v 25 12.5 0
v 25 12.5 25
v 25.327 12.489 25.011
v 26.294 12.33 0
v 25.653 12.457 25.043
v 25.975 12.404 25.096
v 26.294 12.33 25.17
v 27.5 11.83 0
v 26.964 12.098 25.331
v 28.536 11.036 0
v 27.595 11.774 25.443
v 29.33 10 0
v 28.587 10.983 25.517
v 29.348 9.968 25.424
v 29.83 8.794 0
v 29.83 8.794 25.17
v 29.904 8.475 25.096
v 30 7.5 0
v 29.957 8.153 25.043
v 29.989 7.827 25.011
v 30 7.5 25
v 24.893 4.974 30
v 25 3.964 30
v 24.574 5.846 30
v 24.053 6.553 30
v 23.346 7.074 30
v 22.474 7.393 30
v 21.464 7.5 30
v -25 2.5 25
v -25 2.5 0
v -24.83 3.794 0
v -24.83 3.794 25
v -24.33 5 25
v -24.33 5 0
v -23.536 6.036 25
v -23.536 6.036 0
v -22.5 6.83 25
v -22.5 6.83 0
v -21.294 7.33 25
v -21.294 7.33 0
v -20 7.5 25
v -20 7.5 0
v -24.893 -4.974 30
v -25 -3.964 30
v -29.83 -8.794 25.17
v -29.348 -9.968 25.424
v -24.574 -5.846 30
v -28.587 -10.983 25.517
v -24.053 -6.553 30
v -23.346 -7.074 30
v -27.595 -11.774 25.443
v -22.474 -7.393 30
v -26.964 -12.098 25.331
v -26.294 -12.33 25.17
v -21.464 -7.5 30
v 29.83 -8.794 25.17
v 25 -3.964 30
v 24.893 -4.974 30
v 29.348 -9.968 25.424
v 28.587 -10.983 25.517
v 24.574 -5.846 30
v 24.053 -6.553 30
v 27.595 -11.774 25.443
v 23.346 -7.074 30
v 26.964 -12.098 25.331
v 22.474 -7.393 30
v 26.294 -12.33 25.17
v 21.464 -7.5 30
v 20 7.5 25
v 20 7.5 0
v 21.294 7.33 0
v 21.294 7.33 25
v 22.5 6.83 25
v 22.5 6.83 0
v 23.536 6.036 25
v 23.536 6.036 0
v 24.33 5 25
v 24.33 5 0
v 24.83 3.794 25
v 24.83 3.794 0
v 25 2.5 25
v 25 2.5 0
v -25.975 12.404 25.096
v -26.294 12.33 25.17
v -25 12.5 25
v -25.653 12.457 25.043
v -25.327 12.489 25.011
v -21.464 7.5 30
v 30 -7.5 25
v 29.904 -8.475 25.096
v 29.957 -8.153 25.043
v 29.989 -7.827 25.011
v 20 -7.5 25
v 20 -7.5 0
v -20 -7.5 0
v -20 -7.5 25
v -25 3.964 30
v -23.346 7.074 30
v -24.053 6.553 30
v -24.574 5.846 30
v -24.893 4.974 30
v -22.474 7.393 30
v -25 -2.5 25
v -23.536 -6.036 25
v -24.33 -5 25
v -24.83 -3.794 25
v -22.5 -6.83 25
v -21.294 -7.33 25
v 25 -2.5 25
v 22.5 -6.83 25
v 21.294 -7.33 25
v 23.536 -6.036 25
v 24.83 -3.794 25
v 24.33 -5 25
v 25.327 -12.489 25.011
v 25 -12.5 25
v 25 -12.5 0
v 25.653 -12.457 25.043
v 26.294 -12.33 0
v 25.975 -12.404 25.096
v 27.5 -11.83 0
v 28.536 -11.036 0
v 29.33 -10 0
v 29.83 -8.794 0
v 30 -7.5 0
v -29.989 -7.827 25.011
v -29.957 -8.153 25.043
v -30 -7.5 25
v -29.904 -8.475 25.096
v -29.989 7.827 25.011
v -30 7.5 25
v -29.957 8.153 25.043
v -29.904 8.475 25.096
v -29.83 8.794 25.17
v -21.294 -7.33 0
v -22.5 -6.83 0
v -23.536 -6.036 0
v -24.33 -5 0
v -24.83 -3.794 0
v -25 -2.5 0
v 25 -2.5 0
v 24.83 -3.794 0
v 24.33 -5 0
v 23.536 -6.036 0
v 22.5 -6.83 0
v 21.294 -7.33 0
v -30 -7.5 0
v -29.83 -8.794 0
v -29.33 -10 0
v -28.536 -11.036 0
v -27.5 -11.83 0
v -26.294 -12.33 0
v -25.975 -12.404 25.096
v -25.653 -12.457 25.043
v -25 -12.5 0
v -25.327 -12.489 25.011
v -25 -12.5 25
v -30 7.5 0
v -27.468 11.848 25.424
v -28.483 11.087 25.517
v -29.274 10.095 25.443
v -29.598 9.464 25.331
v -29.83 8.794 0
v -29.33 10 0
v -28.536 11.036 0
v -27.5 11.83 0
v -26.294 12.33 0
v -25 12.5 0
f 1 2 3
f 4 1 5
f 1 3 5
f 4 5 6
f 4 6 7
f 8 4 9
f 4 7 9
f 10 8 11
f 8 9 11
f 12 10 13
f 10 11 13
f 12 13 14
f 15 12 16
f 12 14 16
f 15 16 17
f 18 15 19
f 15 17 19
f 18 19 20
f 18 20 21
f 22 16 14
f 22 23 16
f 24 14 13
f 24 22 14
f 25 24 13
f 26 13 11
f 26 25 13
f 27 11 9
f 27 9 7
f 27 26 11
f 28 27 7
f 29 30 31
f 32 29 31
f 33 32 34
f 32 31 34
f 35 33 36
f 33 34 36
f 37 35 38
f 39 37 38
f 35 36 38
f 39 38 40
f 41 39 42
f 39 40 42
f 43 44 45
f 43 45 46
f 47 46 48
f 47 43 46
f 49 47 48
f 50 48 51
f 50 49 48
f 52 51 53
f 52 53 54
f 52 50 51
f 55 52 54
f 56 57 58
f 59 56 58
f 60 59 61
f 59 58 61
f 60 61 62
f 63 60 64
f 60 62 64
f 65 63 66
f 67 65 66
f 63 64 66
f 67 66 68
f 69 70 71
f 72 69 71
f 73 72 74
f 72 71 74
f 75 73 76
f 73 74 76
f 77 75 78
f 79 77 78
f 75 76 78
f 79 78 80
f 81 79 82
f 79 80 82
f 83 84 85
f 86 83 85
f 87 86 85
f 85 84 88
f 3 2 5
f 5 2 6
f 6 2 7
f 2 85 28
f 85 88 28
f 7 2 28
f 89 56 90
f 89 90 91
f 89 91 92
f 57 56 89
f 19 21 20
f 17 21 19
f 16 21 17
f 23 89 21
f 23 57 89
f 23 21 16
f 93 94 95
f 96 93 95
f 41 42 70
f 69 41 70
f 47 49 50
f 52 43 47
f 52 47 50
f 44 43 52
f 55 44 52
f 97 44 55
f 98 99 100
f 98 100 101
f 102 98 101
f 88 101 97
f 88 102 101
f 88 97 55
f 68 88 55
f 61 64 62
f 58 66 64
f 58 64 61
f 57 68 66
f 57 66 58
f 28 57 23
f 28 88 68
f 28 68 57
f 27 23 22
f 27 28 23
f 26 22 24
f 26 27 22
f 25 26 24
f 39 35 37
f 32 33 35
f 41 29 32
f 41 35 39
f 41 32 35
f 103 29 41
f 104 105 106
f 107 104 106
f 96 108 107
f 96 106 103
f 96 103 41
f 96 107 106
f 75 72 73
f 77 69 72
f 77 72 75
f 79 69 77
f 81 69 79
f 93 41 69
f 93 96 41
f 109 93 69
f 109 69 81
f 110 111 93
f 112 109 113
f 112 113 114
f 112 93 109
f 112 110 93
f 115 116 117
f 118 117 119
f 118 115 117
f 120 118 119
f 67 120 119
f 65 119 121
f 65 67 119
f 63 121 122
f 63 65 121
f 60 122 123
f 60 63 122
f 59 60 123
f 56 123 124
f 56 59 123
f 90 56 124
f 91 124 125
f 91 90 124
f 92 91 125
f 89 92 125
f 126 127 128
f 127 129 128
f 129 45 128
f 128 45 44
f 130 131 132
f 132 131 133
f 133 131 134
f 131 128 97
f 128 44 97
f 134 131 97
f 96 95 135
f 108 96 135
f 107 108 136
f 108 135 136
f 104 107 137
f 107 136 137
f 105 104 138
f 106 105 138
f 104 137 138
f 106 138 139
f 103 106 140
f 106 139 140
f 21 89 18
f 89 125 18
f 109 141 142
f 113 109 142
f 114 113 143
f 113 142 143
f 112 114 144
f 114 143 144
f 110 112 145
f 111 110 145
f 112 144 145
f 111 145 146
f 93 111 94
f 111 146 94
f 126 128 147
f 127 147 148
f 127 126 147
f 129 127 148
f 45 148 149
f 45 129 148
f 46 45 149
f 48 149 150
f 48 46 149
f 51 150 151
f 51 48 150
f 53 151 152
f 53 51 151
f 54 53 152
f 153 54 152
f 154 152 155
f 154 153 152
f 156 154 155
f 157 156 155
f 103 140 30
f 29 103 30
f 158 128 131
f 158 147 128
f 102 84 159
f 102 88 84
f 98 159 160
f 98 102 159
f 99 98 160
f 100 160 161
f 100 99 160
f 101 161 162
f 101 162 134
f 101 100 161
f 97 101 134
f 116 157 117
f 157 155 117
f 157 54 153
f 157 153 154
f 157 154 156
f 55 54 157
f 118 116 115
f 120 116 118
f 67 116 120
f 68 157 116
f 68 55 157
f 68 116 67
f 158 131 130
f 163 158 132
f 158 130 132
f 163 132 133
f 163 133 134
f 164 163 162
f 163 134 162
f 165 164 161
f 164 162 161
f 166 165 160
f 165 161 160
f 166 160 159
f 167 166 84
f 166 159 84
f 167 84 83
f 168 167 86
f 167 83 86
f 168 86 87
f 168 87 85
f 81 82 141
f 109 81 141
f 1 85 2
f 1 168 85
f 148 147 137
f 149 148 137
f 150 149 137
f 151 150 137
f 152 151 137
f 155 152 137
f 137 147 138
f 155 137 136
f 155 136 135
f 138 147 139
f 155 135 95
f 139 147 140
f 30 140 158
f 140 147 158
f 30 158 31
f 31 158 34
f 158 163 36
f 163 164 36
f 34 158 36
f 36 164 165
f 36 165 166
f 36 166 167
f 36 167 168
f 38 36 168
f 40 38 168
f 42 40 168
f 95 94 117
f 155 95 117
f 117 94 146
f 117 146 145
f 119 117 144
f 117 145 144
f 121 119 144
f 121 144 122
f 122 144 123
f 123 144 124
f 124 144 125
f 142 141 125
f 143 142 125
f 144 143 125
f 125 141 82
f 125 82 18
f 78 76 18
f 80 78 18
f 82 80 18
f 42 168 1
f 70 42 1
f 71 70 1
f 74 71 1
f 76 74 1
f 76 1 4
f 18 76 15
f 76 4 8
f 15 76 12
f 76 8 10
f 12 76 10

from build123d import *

# Parameters (mm, degrees)
F0_W     = 60
F0_H     = 25
F1_DEPTH = 30
F2_SIZE  = 5
F3_F1_R  = 5
F3_F2_R  = 5
F3_F3_R  = 5
F3_F4_R  = 5
F3_F5_R  = 5
F3_F6_R  = 5
F3_F7_R  = 5
F3_F8_R  = 5
F5_DEPTH = 25


with BuildPart() as f1:
    # F0 (on Top) → F1 (new body)
    with BuildSketch(Plane.XY):
        Rectangle(F0_W, F0_H)
    extrude(amount=F1_DEPTH)

    # F2
    f2_edges = [f1.edges().sort_by_distance(p)[0] for p in [
        (-30, 0, 30),
        (0, -12.5, 30),
        (30, 0, 30),
        (0, 12.5, 30),
    ]]
    chamfer(f2_edges, length=F2_SIZE)

    # F3: fillet of radius 5 on 8 edges, made by hand

    # F3_f1
    f3_f1_edges = [f1.edges().sort_by_distance(p)[0] for p in [
        (-30, 12.5, 12.5),
    ]]
    fillet(f3_f1_edges, radius=F3_F1_R)

    # F3_f2
    f3_f2_edges = [f1.edges().sort_by_distance(p)[0] for p in [
        (-30, -12.5, 12.5),
    ]]
    fillet(f3_f2_edges, radius=F3_F2_R)

    # F3_f3
    f3_f3_edges = [f1.edges().sort_by_distance(p)[0] for p in [
        (30, 12.5, 12.5),
    ]]
    fillet(f3_f3_edges, radius=F3_F3_R)

    # F3_f4
    f3_f4_edges = [f1.edges().sort_by_distance(p)[0] for p in [
        (-26.767766953, 9.267766953, 28.232233047),
    ]]
    fillet(f3_f4_edges, radius=F3_F4_R)

    # F3_f5
    f3_f5_edges = [f1.edges().sort_by_distance(p)[0] for p in [
        (-26.767766953, -9.267766953, 28.232233047),
    ]]
    fillet(f3_f5_edges, radius=F3_F5_R)

    # F3_f6
    f3_f6_edges = [f1.edges().sort_by_distance(p)[0] for p in [
        (30, -12.5, 12.5),
    ]]
    fillet(f3_f6_edges, radius=F3_F6_R)

    # F3_f7
    f3_f7_edges = [f1.edges().sort_by_distance(p)[0] for p in [
        (26.767766953, 9.267766953, 28.232233047),
    ]]
    fillet(f3_f7_edges, radius=F3_F7_R)

    # F3_f8
    f3_f8_edges = [f1.edges().sort_by_distance(p)[0] for p in [
        (26.767766953, -9.267766953, 28.232233047),
    ]]
    fillet(f3_f8_edges, radius=F3_F8_R)

    # F4 (on face) → F5 (cut)
    with BuildSketch(Plane(origin=(0, 0, 0), x_dir=(1, 0, 0), z_dir=(0, 0, -1))):
        with BuildLine():
            ThreePointArc((-25, -2.5), (-23.5355339059, -6.0355339059), (-20, -7.5))
            Line((-20, -7.5), (20, -7.5))
            ThreePointArc((20, -7.5), (23.5355339059, -6.0355339059), (25, -2.5))
            Line((25, -2.5), (25, 2.5))
            ThreePointArc((25, 2.5), (23.5355339059, 6.0355339059), (20, 7.5))
            Line((20, 7.5), (-20, 7.5))
            ThreePointArc((-20, 7.5), (-23.5355339059, 6.0355339059), (-25, 2.5))
            Line((-25, 2.5), (-25, -2.5))
        make_face()
    extrude(amount=-F5_DEPTH, mode=Mode.SUBTRACT)


solid = f1.part
